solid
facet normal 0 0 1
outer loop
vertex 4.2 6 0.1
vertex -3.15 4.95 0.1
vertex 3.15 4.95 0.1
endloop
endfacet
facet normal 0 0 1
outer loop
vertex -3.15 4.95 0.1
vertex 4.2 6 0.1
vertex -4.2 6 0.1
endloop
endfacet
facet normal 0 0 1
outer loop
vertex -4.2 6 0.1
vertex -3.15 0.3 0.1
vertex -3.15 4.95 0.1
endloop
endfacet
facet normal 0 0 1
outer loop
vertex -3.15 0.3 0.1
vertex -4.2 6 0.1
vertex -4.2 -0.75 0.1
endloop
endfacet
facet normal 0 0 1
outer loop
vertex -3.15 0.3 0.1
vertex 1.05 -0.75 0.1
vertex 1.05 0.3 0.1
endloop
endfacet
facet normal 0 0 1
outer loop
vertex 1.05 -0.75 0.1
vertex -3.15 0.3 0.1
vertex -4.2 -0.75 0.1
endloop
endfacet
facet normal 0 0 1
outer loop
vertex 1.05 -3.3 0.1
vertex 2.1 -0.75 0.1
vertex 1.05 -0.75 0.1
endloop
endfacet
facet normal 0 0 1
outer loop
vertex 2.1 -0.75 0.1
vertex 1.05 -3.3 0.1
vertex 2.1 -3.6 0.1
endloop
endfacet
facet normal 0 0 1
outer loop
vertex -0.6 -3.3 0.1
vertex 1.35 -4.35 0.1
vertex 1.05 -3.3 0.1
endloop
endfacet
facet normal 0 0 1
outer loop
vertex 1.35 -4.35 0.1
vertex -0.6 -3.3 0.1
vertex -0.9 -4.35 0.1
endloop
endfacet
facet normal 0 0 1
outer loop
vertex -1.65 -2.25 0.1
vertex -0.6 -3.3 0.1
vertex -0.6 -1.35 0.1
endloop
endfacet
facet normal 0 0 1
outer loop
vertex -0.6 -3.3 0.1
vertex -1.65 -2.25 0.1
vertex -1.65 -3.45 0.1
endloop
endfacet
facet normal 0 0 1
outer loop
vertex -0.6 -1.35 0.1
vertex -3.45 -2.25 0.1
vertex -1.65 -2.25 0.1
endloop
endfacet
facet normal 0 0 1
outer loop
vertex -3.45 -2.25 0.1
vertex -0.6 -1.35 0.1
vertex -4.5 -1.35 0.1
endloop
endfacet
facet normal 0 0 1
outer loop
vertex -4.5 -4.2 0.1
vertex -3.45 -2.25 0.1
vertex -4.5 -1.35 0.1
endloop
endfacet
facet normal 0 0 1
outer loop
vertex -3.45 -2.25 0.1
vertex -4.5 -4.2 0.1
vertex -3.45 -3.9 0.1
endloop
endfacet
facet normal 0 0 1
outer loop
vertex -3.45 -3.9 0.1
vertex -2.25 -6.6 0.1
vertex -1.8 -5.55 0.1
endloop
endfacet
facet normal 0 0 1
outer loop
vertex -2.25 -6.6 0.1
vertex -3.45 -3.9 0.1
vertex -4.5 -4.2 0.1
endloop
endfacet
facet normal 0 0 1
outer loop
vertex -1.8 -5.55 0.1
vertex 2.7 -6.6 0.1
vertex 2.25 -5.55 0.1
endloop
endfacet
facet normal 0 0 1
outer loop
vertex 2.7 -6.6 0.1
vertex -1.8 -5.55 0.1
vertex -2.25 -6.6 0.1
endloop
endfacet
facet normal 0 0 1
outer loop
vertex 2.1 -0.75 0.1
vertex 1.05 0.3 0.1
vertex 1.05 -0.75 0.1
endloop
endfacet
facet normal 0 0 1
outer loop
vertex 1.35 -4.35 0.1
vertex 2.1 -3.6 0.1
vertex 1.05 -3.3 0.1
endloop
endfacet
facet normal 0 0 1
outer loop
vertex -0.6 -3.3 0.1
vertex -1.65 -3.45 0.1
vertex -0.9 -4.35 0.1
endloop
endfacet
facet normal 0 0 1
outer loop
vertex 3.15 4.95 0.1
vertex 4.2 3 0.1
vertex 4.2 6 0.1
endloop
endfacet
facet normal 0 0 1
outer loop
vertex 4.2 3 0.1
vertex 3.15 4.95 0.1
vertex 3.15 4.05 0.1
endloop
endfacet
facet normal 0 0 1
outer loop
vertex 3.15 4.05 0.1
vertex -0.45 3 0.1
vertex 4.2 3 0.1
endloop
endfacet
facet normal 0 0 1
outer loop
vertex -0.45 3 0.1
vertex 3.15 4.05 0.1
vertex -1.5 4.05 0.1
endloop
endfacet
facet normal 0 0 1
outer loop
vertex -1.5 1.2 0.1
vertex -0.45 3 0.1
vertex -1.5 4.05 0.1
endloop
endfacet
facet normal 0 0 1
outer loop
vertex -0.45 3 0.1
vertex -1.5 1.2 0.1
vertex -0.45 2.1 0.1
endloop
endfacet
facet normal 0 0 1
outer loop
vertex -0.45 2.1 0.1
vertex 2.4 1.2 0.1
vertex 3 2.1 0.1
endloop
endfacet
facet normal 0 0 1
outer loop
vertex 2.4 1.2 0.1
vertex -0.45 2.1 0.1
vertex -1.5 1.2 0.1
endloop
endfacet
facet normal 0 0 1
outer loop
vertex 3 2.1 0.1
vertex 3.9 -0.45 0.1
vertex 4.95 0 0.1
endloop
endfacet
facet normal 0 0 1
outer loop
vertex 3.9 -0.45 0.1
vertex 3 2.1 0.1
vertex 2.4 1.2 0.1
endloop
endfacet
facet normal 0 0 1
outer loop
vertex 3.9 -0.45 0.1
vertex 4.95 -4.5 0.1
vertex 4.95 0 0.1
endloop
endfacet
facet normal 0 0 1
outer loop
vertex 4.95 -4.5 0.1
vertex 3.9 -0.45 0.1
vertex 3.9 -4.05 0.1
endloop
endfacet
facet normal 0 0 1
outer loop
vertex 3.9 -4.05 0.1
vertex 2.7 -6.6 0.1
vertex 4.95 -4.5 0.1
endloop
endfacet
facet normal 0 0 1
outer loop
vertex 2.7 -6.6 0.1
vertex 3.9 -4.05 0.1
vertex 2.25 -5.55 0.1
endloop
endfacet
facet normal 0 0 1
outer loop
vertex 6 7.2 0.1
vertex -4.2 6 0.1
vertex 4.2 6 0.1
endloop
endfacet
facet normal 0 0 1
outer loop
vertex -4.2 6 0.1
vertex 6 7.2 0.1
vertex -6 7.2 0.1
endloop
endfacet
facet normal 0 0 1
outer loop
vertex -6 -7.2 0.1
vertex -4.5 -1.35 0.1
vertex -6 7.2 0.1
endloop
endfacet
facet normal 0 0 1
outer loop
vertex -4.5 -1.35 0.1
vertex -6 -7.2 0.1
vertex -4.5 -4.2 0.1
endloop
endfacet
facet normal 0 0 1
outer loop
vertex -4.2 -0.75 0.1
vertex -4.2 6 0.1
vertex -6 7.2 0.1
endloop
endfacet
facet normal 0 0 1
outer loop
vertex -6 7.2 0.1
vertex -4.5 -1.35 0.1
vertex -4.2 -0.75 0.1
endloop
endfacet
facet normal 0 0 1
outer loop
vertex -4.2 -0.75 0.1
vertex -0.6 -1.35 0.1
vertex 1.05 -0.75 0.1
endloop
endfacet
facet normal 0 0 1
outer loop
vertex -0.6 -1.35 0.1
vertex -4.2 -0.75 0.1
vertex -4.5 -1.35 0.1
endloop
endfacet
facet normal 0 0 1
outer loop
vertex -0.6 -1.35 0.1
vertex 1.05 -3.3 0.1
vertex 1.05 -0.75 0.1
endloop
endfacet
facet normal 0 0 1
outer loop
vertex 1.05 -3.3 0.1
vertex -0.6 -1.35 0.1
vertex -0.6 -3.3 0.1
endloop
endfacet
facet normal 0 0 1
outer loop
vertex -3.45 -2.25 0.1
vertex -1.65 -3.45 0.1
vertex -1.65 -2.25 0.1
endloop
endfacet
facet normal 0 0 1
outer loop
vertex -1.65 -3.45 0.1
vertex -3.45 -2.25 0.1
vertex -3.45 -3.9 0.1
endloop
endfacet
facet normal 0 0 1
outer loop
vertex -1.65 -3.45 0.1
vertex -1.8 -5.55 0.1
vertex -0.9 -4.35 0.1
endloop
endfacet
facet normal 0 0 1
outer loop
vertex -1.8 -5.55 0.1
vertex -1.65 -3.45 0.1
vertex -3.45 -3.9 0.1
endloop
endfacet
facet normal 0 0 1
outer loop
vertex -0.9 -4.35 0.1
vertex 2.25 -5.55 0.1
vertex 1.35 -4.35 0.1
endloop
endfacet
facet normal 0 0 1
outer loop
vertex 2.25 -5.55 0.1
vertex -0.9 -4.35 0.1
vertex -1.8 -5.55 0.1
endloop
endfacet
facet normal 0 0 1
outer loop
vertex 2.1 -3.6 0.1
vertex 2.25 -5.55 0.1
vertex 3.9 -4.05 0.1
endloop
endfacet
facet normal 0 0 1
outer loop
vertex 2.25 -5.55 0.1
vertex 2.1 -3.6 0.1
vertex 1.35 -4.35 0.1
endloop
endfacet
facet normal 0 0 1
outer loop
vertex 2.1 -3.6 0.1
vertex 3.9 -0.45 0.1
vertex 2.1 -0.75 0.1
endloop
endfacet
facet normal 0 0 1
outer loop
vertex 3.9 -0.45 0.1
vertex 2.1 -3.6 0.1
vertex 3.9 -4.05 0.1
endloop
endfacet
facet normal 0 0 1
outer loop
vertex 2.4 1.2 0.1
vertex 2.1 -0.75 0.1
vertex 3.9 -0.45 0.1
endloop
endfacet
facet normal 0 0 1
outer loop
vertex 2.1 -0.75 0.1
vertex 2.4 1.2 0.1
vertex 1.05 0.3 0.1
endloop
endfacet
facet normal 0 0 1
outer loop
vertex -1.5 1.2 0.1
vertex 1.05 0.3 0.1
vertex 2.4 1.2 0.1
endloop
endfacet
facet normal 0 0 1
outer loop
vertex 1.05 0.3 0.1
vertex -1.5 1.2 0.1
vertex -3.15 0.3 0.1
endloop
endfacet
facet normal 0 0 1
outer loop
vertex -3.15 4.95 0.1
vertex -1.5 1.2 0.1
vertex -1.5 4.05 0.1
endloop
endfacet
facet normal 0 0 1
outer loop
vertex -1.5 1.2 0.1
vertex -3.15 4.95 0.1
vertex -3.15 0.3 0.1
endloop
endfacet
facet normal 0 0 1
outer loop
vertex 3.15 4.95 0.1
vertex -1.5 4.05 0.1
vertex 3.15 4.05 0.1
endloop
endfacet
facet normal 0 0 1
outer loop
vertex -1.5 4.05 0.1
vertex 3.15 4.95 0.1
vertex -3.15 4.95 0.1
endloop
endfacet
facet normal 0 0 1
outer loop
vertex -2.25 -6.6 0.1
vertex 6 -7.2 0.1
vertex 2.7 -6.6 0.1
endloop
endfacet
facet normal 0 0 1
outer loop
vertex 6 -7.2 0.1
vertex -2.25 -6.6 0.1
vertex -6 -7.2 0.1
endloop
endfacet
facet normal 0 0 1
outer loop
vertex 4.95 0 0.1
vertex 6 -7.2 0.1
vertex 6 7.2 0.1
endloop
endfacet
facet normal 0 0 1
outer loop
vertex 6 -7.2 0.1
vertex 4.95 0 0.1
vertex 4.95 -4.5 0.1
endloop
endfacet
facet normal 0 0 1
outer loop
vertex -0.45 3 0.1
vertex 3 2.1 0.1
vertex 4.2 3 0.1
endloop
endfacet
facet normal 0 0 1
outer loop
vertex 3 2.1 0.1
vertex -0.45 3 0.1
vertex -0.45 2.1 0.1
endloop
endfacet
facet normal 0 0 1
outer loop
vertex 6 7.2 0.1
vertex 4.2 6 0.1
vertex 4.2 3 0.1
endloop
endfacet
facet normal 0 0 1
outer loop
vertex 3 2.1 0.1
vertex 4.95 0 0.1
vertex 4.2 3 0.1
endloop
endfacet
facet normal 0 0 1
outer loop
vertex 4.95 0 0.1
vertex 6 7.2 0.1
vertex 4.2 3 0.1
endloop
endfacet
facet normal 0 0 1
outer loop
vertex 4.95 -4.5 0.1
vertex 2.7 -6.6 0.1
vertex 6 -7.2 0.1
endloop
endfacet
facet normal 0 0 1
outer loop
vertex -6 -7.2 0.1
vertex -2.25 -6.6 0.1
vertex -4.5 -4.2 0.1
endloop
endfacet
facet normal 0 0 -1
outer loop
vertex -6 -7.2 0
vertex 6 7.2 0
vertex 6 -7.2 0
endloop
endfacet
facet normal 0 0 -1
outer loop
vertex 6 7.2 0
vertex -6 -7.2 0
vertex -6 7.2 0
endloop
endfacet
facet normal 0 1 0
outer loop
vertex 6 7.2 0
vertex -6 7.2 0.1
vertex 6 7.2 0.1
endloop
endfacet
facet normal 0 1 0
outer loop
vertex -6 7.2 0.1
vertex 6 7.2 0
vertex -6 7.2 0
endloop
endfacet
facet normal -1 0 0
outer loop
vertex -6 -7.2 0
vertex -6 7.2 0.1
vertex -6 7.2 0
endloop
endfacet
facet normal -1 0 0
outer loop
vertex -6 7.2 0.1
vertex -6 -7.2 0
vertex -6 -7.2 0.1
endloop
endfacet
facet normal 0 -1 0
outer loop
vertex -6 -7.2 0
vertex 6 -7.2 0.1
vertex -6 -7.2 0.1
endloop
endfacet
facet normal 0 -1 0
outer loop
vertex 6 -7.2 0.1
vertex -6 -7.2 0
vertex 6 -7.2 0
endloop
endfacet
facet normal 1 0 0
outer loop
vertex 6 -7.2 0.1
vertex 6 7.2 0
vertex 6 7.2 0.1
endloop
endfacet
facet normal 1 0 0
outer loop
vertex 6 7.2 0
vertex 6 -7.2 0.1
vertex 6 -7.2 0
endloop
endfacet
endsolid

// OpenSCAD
// file: ../p/box5-12.scad
use <../lib.scad>
function ldraw_lib__box5_12() = [
// 0 Box with 5 Faces without Any Edges
// 0 Name: box5-12.dat
// 0 Author: Chris Dee [cwdee]
// 0 !LDRAW_ORG Primitive UPDATE 2009-02
// 0 !LICENSE Licensed under CC BY 4.0 : see CAreadme.txt
// 
// 0 BFC CERTIFY CCW
  [0,"BFC","CERTIFY"],
  [0,"BFC","CCW"],
// 
// 0 !HISTORY 2009-09-03 [PTadmin] Official Update 2009-02
// 
// 
// 4 16 1 1 1 1 1 -1 -1 1 -1 -1 1 1
  [4,16,1,1,1,1,1,-1,-1,1,-1,-1,1,1],
// 4 16 -1 0 1 1 0 1 1 1 1 -1 1 1
  [4,16,-1,0,1,1,0,1,1,1,1,-1,1,1],
// 4 16 -1 0 -1 -1 0 1 -1 1 1 -1 1 -1
  [4,16,-1,0,-1,-1,0,1,-1,1,1,-1,1,-1],
// 4 16 1 0 -1 -1 0 -1 -1 1 -1 1 1 -1
  [4,16,1,0,-1,-1,0,-1,-1,1,-1,1,1,-1],
// 4 16 1 0 1 1 0 -1 1 1 -1 1 1 1
  [4,16,1,0,1,1,0,-1,1,1,-1,1,1,1],
// 0
];
module ldraw_lib__box5_12(step=0, col=false, unit=2/5, alt=false, line=0.2, solid=!$preview)
    makepoly(ldraw_lib__box5_12(), step=step, col=col, unit=unit, alt=alt, line=line, solid=solid);
ldraw_lib__box5_12(line=0.2);
// file: 164365c.scad
use <../lib.scad>
use <../p/box5-12.scad>
function ldraw_lib__164365c() = [
// 0 Sticker  1.2 x  1 with Red Outline "5"
// 0 Name: 164365c.dat
// 0 Author: Michael Heidemann [mikeheide]
// 0 !LDRAW_ORG Part UPDATE 2012-02
// 0 !LICENSE Licensed under CC BY 4.0 : see CAreadme.txt
// 
// 0 BFC CERTIFY CCW
  [0,"BFC","CERTIFY"],
  [0,"BFC","CCW"],
// 
// 0 !KEYWORDS set 6440
// 
// 0 !HISTORY 2012-08-09 [PTadmin] Official Update 2012-02
// 
// 
// 4 4 5.25 -0.25 8.25 7 -0.25 10 -7 -0.25 10 -5.25 -0.25 8.25
  [4,4,5.25,-0.25,8.25,7,-0.25,10,-7,-0.25,10,-5.25,-0.25,8.25],
// 4 4 -5.25 -0.25 0.5 -5.25 -0.25 8.25 -7 -0.25 10 -7 -0.25 -1.25
  [4,4,-5.25,-0.25,0.5,-5.25,-0.25,8.25,-7,-0.25,10,-7,-0.25,-1.25],
// 4 4 -7 -0.25 -1.25 1.75 -0.25 -1.25 1.75 -0.25 0.5 -5.25 -0.25 0.5
  [4,4,-7,-0.25,-1.25,1.75,-0.25,-1.25,1.75,-0.25,0.5,-5.25,-0.25,0.5],
// 4 4 3.5 -0.25 -6 3.5 -0.25 -1.25 1.75 -0.25 -1.25 1.75 -0.25 -5.5
  [4,4,3.5,-0.25,-6,3.5,-0.25,-1.25,1.75,-0.25,-1.25,1.75,-0.25,-5.5],
// 4 4 1.75 -0.25 -5.5 -1 -0.25 -5.5 -1.5 -0.25 -7.25 2.25 -0.25 -7.25
  [4,4,1.75,-0.25,-5.5,-1,-0.25,-5.5,-1.5,-0.25,-7.25,2.25,-0.25,-7.25],
// 4 4 -2.75 -0.25 -3.75 -2.75 -0.25 -5.75 -1 -0.25 -5.5 -1 -0.25 -2.25
  [4,4,-2.75,-0.25,-3.75,-2.75,-0.25,-5.75,-1,-0.25,-5.5,-1,-0.25,-2.25],
// 4 4 -1 -0.25 -2.25 -7.5 -0.25 -2.25 -5.75 -0.25 -3.75 -2.75 -0.25 -3.75
  [4,4,-1,-0.25,-2.25,-7.5,-0.25,-2.25,-5.75,-0.25,-3.75,-2.75,-0.25,-3.75],
// 4 4 -7.5 -0.25 -2.25 -7.5 -0.25 -7 -5.75 -0.25 -6.5 -5.75 -0.25 -3.75
  [4,4,-7.5,-0.25,-2.25,-7.5,-0.25,-7,-5.75,-0.25,-6.5,-5.75,-0.25,-3.75],
// 4 4 -3.75 -0.25 -11 -3 -0.25 -9.25 -5.75 -0.25 -6.5 -7.5 -0.25 -7
  [4,4,-3.75,-0.25,-11,-3,-0.25,-9.25,-5.75,-0.25,-6.5,-7.5,-0.25,-7],
// 4 4 4.5 -0.25 -11 3.75 -0.25 -9.25 -3 -0.25 -9.25 -3.75 -0.25 -11
  [4,4,4.5,-0.25,-11,3.75,-0.25,-9.25,-3,-0.25,-9.25,-3.75,-0.25,-11],
// 3 4 3.5 -0.25 -1.25 1.75 -0.25 0.5 1.75 -0.25 -1.25
  [3,4,3.5,-0.25,-1.25,1.75,-0.25,0.5,1.75,-0.25,-1.25],
// 3 4 2.25 -0.25 -7.25 3.5 -0.25 -6 1.75 -0.25 -5.5
  [3,4,2.25,-0.25,-7.25,3.5,-0.25,-6,1.75,-0.25,-5.5],
// 3 4 -1 -0.25 -5.5 -2.75 -0.25 -5.75 -1.5 -0.25 -7.25
  [3,4,-1,-0.25,-5.5,-2.75,-0.25,-5.75,-1.5,-0.25,-7.25],
// 4 4 7 -0.25 5 7 -0.25 10 5.25 -0.25 8.25 5.25 -0.25 6.75
  [4,4,7,-0.25,5,7,-0.25,10,5.25,-0.25,8.25,5.25,-0.25,6.75],
// 4 4 -0.75 -0.25 5 7 -0.25 5 5.25 -0.25 6.75 -2.5 -0.25 6.75
  [4,4,-0.75,-0.25,5,7,-0.25,5,5.25,-0.25,6.75,-2.5,-0.25,6.75],
// 4 4 -0.75 -0.25 3.5 -0.75 -0.25 5 -2.5 -0.25 6.75 -2.5 -0.25 2
  [4,4,-0.75,-0.25,3.5,-0.75,-0.25,5,-2.5,-0.25,6.75,-2.5,-0.25,2],
// 4 4 5 -0.25 3.5 -0.75 -0.25 3.5 -2.5 -0.25 2 4 -0.25 2
  [4,4,5,-0.25,3.5,-0.75,-0.25,3.5,-2.5,-0.25,2,4,-0.25,2],
// 4 4 8.25 -0.25 0 5 -0.25 3.5 4 -0.25 2 6.5 -0.25 -0.75
  [4,4,8.25,-0.25,0,5,-0.25,3.5,4,-0.25,2,6.5,-0.25,-0.75],
// 4 4 8.25 -0.25 -7.5 8.25 -0.25 0 6.5 -0.25 -0.75 6.5 -0.25 -6.75
  [4,4,8.25,-0.25,-7.5,8.25,-0.25,0,6.5,-0.25,-0.75,6.5,-0.25,-6.75],
// 4 4 6.5 -0.25 -6.75 3.75 -0.25 -9.25 4.5 -0.25 -11 8.25 -0.25 -7.5
  [4,4,6.5,-0.25,-6.75,3.75,-0.25,-9.25,4.5,-0.25,-11,8.25,-0.25,-7.5],
// 4 16 -10 -0.25 12 -7 -0.25 10 7 -0.25 10 10 -0.25 12
  [4,16,-10,-0.25,12,-7,-0.25,10,7,-0.25,10,10,-0.25,12],
// 4 16 -10 -0.25 -12 -7.5 -0.25 -7 -7.5 -0.25 -2.25 -10 -0.25 12
  [4,16,-10,-0.25,-12,-7.5,-0.25,-7,-7.5,-0.25,-2.25,-10,-0.25,12],
// 3 16 -7 -0.25 -1.25 -7 -0.25 10 -10 -0.25 12
  [3,16,-7,-0.25,-1.25,-7,-0.25,10,-10,-0.25,12],
// 3 16 -10 -0.25 12 -7.5 -0.25 -2.25 -7 -0.25 -1.25
  [3,16,-10,-0.25,12,-7.5,-0.25,-2.25,-7,-0.25,-1.25],
// 4 16 -7 -0.25 -1.25 -7.5 -0.25 -2.25 -1 -0.25 -2.25 1.75 -0.25 -1.25
  [4,16,-7,-0.25,-1.25,-7.5,-0.25,-2.25,-1,-0.25,-2.25,1.75,-0.25,-1.25],
// 4 16 1.75 -0.25 -1.25 -1 -0.25 -2.25 -1 -0.25 -5.5 1.75 -0.25 -5.5
  [4,16,1.75,-0.25,-1.25,-1,-0.25,-2.25,-1,-0.25,-5.5,1.75,-0.25,-5.5],
// 4 16 -2.75 -0.25 -5.75 -2.75 -0.25 -3.75 -5.75 -0.25 -3.75 -5.75 -0.25 -6.5
  [4,16,-2.75,-0.25,-5.75,-2.75,-0.25,-3.75,-5.75,-0.25,-3.75,-5.75,-0.25,-6.5],
// 4 16 -1.5 -0.25 -7.25 -2.75 -0.25 -5.75 -5.75 -0.25 -6.5 -3 -0.25 -9.25
  [4,16,-1.5,-0.25,-7.25,-2.75,-0.25,-5.75,-5.75,-0.25,-6.5,-3,-0.25,-9.25],
// 4 16 2.25 -0.25 -7.25 -1.5 -0.25 -7.25 -3 -0.25 -9.25 3.75 -0.25 -9.25
  [4,16,2.25,-0.25,-7.25,-1.5,-0.25,-7.25,-3,-0.25,-9.25,3.75,-0.25,-9.25],
// 4 16 6.5 -0.25 -6.75 3.5 -0.25 -6 2.25 -0.25 -7.25 3.75 -0.25 -9.25
  [4,16,6.5,-0.25,-6.75,3.5,-0.25,-6,2.25,-0.25,-7.25,3.75,-0.25,-9.25],
// 4 16 6.5 -0.25 -0.75 3.5 -0.25 -1.25 3.5 -0.25 -6 6.5 -0.25 -6.75
  [4,16,6.5,-0.25,-0.75,3.5,-0.25,-1.25,3.5,-0.25,-6,6.5,-0.25,-6.75],
// 4 16 4 -0.25 2 1.75 -0.25 0.5 3.5 -0.25 -1.25 6.5 -0.25 -0.75
  [4,16,4,-0.25,2,1.75,-0.25,0.5,3.5,-0.25,-1.25,6.5,-0.25,-0.75],
// 4 16 1.75 -0.25 0.5 4 -0.25 2 -2.5 -0.25 2 -5.25 -0.25 0.5
  [4,16,1.75,-0.25,0.5,4,-0.25,2,-2.5,-0.25,2,-5.25,-0.25,0.5],
// 4 16 -2.5 -0.25 6.75 -5.25 -0.25 8.25 -5.25 -0.25 0.5 -2.5 -0.25 2
  [4,16,-2.5,-0.25,6.75,-5.25,-0.25,8.25,-5.25,-0.25,0.5,-2.5,-0.25,2],
// 4 16 5.25 -0.25 6.75 5.25 -0.25 8.25 -5.25 -0.25 8.25 -2.5 -0.25 6.75
  [4,16,5.25,-0.25,6.75,5.25,-0.25,8.25,-5.25,-0.25,8.25,-2.5,-0.25,6.75],
// 4 16 4.5 -0.25 -11 -3.75 -0.25 -11 -10 -0.25 -12 10 -0.25 -12
  [4,16,4.5,-0.25,-11,-3.75,-0.25,-11,-10,-0.25,-12,10,-0.25,-12],
// 4 16 8.25 -0.25 0 8.25 -0.25 -7.5 10 -0.25 -12 10 -0.25 12
  [4,16,8.25,-0.25,0,8.25,-0.25,-7.5,10,-0.25,-12,10,-0.25,12],
// 4 16 5 -0.25 3.5 7 -0.25 5 -0.75 -0.25 5 -0.75 -0.25 3.5
  [4,16,5,-0.25,3.5,7,-0.25,5,-0.75,-0.25,5,-0.75,-0.25,3.5],
// 3 16 10 -0.25 12 7 -0.25 10 7 -0.25 5
  [3,16,10,-0.25,12,7,-0.25,10,7,-0.25,5],
// 3 16 5 -0.25 3.5 8.25 -0.25 0 7 -0.25 5
  [3,16,5,-0.25,3.5,8.25,-0.25,0,7,-0.25,5],
// 3 16 8.25 -0.25 0 10 -0.25 12 7 -0.25 5
  [3,16,8.25,-0.25,0,10,-0.25,12,7,-0.25,5],
// 3 16 8.25 -0.25 -7.5 4.5 -0.25 -11 10 -0.25 -12
  [3,16,8.25,-0.25,-7.5,4.5,-0.25,-11,10,-0.25,-12],
// 3 16 -10 -0.25 -12 -3.75 -0.25 -11 -7.5 -0.25 -7
  [3,16,-10,-0.25,-12,-3.75,-0.25,-11,-7.5,-0.25,-7],
// 0 // Pattern created wholly or in part by Quad2Dat
// 0 // Thanks James
// 1 16 0 -0.25 0 10 0 0 0 0.25 0 0 0 12 box5-12.dat
  [1,16,0,-0.25,0,10,0,0,0,0.25,0,0,0,12, ldraw_lib__box5_12()],
];
module ldraw_lib__164365c(step=0, col=false, unit=2/5, alt=false, line=0.2, solid=!$preview)
    makepoly(ldraw_lib__164365c(), step=step, col=col, unit=unit, alt=alt, line=line, solid=solid);
ldraw_lib__164365c(line=0.2);
// main file
use <../lib.scad>
use <164365c.scad>
function ldraw_lib__164365b() = [
// 0 Sticker  1.8 x  1.5 with Red Outline "5"
// 0 Name: 164365b.dat
// 0 Author: Takeshi Takahashi [RainbowDolphin]
// 0 !LDRAW_ORG Part UPDATE 2022-05
// 0 !LICENSE Licensed under CC BY 4.0 : see CAreadme.txt
// 
// 0 BFC CERTIFY CCW
  [0,"BFC","CERTIFY"],
  [0,"BFC","CCW"],
// 
// 0 !KEYWORDS Airport, Fire engine, Jetport fire squad, set 6440
// 
// 0 !HISTORY 2022-09-15 [PTadmin] Official Update 2022-05
// 
// 
// 1 16 0 0 0 1.5 0 0 0 1 0 0 0 1.5 164365c.dat
  [1,16,0,0,0,1.5,0,0,0,1,0,0,0,1.5, ldraw_lib__164365c()],
];
module ldraw_lib__164365b(step=0, col=false, unit=2/5, alt=false, line=0.2, solid=!$preview)
    makepoly(ldraw_lib__164365b(), step=step, col=col, unit=unit, alt=alt, line=line, solid=solid);
ldraw_lib__164365b(line=0.2);
